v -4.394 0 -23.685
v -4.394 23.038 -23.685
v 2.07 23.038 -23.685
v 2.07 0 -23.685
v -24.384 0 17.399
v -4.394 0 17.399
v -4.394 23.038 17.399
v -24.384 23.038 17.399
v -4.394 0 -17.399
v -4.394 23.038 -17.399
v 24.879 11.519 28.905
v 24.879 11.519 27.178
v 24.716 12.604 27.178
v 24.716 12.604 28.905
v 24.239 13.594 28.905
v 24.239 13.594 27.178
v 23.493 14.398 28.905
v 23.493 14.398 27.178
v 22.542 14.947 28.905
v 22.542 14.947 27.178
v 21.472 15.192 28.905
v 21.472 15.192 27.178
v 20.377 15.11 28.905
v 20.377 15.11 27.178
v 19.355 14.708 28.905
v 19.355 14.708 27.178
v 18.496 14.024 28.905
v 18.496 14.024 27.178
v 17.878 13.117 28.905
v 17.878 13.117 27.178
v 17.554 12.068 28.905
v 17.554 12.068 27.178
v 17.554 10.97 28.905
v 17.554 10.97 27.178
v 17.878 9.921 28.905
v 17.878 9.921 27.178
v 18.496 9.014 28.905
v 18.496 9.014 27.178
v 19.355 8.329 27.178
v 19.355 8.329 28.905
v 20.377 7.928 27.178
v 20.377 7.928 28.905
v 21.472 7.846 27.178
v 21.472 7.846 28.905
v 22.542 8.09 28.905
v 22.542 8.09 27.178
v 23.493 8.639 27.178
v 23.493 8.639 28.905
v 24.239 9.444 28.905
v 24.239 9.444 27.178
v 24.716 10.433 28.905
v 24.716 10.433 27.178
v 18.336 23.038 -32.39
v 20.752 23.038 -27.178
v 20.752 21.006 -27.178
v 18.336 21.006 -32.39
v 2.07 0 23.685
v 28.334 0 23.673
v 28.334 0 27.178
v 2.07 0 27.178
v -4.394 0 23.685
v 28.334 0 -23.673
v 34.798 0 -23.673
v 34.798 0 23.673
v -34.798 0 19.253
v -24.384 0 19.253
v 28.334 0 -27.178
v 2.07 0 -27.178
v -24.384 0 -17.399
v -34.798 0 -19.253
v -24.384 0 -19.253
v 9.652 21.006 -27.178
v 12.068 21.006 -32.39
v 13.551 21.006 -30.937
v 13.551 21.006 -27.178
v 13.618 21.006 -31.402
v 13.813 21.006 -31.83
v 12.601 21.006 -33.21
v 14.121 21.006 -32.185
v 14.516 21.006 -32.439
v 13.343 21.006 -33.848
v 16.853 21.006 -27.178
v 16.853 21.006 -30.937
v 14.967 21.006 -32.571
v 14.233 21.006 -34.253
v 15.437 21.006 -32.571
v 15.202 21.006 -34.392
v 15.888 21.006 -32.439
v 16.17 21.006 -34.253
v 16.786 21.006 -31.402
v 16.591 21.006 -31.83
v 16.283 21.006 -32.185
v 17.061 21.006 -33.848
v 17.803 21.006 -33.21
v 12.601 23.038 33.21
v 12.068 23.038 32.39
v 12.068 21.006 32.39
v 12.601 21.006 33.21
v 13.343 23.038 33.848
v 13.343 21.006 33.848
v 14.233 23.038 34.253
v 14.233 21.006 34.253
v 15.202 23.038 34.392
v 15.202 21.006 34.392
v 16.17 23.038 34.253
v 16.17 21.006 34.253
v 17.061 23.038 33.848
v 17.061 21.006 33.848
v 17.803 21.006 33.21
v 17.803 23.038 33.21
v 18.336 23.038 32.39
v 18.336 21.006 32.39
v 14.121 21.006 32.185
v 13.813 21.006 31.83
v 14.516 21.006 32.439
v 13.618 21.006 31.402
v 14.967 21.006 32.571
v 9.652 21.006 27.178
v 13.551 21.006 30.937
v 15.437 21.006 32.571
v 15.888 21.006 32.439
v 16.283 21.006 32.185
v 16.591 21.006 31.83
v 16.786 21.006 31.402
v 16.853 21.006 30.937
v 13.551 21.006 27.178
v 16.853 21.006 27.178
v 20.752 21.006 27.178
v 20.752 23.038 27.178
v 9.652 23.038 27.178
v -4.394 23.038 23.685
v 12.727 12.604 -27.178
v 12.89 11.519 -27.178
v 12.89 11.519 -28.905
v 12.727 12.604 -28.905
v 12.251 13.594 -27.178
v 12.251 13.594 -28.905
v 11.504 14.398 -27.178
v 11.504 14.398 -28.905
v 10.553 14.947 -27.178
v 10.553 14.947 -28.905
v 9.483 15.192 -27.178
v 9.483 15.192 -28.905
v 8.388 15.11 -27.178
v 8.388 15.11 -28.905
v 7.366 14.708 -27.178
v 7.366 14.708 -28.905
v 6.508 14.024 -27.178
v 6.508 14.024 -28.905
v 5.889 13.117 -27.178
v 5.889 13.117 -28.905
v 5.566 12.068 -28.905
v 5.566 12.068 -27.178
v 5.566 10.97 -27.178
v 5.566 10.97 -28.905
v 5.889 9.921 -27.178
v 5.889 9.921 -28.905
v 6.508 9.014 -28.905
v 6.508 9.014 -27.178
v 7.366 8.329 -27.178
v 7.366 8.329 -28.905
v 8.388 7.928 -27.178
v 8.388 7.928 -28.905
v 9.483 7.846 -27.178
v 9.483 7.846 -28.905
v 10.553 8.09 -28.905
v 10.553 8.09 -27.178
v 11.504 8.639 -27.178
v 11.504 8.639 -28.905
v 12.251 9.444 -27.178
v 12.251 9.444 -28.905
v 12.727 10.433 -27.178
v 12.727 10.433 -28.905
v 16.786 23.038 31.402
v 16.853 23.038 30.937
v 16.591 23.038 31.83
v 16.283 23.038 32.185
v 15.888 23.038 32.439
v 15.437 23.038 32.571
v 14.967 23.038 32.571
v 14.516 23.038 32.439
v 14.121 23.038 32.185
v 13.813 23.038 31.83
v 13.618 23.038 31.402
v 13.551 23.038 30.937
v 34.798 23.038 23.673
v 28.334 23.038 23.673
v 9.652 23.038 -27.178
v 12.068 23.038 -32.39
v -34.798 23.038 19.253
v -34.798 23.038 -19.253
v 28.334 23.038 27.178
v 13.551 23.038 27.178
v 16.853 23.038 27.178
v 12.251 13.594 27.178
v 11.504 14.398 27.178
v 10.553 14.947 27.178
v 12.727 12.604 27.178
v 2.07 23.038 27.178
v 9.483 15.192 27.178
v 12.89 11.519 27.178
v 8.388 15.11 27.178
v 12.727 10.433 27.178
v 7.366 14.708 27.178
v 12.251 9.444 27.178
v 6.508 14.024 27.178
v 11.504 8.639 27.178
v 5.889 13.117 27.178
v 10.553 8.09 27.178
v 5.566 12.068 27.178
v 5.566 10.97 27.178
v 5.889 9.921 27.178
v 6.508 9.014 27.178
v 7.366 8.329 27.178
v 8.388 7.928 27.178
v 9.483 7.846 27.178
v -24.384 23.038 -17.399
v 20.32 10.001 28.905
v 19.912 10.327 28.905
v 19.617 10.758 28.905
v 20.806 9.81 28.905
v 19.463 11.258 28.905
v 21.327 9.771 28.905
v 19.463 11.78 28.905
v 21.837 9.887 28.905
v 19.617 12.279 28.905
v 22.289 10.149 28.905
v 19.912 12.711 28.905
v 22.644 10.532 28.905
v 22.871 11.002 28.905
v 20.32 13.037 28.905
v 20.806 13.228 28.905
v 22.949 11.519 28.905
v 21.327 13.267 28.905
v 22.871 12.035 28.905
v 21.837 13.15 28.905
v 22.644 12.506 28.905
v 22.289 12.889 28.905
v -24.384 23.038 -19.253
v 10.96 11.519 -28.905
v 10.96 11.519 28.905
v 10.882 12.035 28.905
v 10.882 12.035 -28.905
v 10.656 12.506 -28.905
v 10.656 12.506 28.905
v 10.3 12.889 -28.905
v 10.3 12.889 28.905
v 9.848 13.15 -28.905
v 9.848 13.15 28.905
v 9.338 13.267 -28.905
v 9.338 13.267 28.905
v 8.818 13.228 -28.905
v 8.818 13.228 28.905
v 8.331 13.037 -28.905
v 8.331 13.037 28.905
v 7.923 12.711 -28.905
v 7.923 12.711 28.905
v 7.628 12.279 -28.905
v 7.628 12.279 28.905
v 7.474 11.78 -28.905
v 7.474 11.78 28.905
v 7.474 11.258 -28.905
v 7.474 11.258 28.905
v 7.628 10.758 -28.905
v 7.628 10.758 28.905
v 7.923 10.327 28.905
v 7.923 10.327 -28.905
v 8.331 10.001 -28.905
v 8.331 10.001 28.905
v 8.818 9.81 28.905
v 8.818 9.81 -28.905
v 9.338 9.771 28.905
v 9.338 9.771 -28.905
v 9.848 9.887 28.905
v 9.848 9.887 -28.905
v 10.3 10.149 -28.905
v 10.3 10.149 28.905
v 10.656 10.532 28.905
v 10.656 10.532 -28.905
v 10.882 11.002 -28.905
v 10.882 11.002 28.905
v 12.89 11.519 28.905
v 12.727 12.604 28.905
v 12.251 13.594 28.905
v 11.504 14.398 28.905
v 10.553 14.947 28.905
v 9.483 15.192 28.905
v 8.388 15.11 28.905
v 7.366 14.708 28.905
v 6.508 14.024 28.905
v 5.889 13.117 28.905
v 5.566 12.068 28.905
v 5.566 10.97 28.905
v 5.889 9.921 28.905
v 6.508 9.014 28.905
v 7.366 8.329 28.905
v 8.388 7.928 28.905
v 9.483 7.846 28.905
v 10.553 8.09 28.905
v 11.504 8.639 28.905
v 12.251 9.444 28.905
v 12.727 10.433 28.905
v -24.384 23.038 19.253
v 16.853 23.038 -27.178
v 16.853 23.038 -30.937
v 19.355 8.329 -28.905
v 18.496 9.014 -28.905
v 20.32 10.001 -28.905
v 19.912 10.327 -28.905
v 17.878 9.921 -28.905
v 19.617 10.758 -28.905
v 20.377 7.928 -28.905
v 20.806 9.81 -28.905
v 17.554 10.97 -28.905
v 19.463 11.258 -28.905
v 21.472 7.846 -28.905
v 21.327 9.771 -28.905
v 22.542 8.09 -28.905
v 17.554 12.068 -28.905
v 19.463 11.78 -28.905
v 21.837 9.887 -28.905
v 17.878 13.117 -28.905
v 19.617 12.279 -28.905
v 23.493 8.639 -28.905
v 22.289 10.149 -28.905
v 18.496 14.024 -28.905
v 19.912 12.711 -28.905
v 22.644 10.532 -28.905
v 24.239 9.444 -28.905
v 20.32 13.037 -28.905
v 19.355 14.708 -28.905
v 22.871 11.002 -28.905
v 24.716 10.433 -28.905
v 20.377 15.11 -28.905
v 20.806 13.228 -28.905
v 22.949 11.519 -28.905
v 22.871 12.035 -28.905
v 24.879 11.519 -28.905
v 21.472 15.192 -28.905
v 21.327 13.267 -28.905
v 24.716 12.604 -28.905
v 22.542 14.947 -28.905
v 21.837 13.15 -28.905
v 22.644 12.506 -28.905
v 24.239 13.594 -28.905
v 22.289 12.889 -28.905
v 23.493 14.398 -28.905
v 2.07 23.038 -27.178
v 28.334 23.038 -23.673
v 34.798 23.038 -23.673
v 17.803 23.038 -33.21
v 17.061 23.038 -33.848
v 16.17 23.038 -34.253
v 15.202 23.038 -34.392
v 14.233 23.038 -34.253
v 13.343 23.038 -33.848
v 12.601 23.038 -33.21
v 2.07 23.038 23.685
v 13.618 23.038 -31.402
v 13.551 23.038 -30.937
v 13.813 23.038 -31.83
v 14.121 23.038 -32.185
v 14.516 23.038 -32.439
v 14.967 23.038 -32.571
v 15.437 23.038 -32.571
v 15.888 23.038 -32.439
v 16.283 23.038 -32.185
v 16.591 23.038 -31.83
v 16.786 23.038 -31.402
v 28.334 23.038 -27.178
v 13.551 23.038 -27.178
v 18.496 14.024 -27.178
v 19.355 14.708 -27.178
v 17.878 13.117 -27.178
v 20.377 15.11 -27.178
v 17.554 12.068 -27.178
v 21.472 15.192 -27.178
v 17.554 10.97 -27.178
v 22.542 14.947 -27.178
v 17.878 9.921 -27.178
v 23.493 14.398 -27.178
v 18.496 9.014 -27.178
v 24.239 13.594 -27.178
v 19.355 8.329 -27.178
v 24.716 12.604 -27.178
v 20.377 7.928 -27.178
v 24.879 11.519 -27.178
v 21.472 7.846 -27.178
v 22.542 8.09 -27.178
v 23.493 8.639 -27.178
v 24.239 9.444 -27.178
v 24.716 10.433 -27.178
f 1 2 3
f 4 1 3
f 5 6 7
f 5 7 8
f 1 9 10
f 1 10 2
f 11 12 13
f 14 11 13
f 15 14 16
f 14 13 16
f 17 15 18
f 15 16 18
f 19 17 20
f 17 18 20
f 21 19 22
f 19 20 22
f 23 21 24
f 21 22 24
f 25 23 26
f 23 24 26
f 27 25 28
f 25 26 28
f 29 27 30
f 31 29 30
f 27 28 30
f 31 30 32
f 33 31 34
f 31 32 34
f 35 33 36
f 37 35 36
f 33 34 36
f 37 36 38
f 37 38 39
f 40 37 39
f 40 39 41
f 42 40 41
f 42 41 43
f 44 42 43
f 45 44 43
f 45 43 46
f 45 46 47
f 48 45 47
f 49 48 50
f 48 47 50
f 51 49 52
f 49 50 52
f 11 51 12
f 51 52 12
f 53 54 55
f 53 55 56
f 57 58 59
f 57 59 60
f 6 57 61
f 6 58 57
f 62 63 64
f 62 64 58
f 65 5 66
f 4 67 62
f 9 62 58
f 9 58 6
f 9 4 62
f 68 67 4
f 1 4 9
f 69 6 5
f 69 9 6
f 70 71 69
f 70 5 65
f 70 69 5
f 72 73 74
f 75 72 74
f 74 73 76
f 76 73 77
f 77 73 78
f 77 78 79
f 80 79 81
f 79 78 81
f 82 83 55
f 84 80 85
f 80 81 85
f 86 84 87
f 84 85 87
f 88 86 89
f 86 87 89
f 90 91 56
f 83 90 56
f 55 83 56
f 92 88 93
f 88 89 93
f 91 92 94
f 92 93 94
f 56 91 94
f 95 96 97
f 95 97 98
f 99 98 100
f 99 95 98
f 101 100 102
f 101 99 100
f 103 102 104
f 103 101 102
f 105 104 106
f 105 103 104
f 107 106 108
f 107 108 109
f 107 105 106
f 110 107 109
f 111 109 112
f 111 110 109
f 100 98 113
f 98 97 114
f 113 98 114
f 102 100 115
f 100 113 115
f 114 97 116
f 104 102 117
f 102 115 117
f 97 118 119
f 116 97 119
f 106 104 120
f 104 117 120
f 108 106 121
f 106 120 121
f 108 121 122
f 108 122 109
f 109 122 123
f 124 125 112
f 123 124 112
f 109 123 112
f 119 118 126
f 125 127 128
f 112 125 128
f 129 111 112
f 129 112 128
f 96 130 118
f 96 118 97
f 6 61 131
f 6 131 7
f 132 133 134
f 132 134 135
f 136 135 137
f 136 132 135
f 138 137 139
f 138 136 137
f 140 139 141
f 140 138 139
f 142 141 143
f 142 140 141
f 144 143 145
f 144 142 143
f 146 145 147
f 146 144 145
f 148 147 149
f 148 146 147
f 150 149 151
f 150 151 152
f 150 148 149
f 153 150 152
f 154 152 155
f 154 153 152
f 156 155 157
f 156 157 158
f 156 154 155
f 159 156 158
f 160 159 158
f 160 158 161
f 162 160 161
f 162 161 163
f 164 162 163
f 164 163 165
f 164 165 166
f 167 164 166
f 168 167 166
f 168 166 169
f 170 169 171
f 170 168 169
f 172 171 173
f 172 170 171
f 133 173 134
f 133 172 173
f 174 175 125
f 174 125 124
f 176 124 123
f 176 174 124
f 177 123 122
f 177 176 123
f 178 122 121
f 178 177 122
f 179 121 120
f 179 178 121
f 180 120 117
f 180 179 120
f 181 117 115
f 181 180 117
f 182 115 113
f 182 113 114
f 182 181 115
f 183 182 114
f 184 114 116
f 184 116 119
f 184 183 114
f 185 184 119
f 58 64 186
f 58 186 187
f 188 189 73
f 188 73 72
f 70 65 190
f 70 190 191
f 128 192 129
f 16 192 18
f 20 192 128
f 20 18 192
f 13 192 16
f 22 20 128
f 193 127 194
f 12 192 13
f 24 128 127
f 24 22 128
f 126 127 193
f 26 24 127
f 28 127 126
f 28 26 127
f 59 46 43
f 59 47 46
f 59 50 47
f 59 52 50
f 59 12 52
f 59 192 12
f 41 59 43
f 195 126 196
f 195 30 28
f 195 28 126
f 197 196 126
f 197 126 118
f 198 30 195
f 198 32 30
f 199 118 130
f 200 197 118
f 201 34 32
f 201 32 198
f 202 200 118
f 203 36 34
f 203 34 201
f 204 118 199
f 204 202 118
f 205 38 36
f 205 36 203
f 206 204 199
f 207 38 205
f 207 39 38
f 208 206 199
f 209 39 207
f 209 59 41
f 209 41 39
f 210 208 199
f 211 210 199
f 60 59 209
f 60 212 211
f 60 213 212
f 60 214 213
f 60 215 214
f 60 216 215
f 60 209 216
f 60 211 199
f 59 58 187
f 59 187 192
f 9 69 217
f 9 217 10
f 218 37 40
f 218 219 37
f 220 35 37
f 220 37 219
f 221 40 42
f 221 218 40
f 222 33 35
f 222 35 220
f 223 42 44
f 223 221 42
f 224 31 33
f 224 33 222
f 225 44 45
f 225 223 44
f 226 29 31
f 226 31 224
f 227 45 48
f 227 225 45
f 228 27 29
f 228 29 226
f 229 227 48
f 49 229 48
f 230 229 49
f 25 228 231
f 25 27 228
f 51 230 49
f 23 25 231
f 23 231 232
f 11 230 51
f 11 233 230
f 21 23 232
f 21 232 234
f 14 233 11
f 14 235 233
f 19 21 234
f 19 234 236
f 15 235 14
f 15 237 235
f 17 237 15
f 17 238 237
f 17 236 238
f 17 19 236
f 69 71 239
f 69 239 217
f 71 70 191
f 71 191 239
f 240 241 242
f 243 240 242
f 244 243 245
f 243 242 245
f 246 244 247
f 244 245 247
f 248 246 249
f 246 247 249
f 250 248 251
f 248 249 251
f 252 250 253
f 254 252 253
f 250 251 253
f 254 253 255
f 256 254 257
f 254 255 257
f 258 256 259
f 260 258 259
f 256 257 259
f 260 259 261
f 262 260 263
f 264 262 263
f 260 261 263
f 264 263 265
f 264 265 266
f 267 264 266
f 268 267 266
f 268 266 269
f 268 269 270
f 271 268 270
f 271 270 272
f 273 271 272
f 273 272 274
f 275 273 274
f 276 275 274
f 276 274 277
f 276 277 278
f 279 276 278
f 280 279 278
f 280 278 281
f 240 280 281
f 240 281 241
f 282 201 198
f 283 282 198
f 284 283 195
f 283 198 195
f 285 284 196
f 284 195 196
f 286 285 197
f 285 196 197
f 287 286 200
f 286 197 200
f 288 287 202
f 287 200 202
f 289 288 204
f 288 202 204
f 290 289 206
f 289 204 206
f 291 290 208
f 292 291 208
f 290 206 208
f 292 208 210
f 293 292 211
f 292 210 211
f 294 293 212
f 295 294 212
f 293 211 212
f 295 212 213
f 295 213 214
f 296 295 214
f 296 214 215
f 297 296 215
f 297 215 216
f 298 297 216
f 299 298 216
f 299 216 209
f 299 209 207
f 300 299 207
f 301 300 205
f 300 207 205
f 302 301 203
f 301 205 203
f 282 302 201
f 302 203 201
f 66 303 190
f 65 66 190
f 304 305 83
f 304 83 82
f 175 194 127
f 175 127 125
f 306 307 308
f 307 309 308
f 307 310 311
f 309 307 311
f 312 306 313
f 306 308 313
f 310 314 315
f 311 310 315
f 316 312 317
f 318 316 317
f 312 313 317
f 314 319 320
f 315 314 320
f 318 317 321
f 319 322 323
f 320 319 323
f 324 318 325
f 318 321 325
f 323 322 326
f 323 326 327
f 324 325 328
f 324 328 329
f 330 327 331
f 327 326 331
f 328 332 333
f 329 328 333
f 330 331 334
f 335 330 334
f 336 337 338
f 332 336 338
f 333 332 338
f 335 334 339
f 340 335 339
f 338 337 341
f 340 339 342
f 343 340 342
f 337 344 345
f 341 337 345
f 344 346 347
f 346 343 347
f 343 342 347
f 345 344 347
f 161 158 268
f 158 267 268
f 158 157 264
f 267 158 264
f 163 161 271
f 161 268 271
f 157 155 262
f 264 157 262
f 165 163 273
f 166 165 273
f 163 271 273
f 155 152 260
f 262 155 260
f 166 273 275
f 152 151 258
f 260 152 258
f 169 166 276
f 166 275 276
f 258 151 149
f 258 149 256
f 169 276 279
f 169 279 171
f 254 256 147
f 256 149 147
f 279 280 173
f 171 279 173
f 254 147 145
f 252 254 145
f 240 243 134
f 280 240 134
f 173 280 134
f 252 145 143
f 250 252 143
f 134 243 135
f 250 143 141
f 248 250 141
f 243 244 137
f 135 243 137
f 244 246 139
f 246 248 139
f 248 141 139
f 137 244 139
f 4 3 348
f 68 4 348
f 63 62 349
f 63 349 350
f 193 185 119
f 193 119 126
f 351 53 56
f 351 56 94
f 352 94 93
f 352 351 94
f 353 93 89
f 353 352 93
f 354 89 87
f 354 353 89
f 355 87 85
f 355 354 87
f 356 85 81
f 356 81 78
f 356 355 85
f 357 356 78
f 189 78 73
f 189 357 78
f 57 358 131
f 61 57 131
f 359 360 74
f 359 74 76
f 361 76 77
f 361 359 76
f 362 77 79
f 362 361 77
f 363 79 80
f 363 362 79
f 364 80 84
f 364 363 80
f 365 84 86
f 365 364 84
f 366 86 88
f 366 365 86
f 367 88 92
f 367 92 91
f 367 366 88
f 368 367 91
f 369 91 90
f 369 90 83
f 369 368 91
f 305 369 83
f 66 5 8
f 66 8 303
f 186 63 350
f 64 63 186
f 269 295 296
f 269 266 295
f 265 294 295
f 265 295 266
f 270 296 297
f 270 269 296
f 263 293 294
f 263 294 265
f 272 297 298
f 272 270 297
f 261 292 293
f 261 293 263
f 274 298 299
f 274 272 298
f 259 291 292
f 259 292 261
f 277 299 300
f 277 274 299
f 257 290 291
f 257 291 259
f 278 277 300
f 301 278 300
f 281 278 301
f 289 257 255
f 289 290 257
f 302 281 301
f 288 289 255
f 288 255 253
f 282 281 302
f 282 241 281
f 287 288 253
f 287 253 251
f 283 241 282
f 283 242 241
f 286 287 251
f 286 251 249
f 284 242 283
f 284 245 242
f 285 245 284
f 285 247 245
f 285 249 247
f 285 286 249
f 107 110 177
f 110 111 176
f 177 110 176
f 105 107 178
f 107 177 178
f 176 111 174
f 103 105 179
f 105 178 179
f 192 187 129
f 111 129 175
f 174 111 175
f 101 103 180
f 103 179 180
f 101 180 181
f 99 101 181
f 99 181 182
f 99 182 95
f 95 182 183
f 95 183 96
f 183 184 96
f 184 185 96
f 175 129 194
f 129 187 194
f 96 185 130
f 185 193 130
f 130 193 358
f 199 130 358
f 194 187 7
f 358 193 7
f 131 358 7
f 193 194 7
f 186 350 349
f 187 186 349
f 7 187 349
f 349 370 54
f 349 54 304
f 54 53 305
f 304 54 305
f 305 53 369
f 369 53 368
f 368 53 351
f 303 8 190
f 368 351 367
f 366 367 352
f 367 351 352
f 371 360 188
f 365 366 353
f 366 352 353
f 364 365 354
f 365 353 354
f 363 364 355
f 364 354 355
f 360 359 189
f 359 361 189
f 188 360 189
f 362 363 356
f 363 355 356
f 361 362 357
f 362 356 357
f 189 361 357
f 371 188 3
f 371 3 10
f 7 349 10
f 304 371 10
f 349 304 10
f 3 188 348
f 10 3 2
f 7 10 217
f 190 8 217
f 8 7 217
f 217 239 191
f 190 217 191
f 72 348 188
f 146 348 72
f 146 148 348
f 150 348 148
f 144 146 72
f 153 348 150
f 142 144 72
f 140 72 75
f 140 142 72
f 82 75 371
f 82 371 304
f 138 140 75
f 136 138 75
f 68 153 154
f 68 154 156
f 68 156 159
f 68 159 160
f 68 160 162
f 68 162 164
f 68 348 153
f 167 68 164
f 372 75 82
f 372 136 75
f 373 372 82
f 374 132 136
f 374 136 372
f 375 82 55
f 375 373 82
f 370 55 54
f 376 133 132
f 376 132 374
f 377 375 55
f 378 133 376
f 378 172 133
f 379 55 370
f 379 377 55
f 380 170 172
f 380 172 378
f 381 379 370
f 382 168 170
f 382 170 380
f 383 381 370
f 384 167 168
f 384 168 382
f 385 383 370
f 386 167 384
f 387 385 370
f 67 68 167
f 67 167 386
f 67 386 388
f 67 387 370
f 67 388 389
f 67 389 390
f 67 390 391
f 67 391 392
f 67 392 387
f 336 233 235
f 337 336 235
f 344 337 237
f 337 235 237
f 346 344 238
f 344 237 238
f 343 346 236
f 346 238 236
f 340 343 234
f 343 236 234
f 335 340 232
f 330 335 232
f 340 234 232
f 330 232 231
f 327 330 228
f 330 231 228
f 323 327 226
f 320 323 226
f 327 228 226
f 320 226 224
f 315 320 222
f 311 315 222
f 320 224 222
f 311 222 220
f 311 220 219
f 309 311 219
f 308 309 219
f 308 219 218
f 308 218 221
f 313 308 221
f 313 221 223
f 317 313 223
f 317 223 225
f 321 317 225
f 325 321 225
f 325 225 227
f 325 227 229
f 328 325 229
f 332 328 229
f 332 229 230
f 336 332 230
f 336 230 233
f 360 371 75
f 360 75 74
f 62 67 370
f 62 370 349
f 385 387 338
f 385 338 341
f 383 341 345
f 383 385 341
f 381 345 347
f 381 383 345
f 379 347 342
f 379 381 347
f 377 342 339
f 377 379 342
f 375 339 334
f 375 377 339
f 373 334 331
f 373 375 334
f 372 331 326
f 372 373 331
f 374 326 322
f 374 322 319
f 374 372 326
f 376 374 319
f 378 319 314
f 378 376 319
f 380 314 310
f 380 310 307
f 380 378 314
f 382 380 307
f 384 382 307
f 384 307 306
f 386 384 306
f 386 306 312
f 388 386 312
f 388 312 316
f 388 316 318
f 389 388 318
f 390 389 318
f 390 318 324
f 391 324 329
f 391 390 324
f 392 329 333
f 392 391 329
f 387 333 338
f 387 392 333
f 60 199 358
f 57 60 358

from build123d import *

# Parameters (mm, degrees)
BOSS_EXTRUDE1_DEPTH = 23.0378
SKETCH2_R           = 3.683
BOSS_EXTRUDE2_DEPTH = 1.7272
SKETCH3_R           = 1.7526
CUT_EXTRUDE1_DEPTH  = 58.8104
BOSS_EXTRUDE3_DEPTH = 2.032


with BuildPart() as part:
    # Sketch1 → Boss-Extrude1 (new body)
    with BuildSketch(Plane(origin=(0, 0, 0), x_dir=(1, 0, 0), z_dir=(0, 1, 0))):
        Polygon((-34.798, 19.2532), (-24.384, 19.2532), (-24.384, 17.399), (-4.3942, 17.399), (-4.3942, 23.684705806), (2.0701, 23.684705806), (2.0701, 27.178), (28.3337, 27.178), (28.3337, 23.6728), (34.798, 23.6728), (34.798, -23.6728), (28.3337, -23.6728), (28.3337, -27.178), (2.0701, -27.178), (2.0701, -23.684705806), (-4.3942, -23.684705806), (-4.3942, -17.399), (-24.384, -17.399), (-24.384, -19.2532), (-34.798, -19.2532), align=None)
    extrude(amount=BOSS_EXTRUDE1_DEPTH)

    # Sketch2 → Boss-Extrude2 (add)
    with BuildSketch(Plane.XY.offset(27.178)):
        with Locations((21.1963, 11.5189)):
            Circle(SKETCH2_R)
        with Locations((9.2075, 11.5189)):
            Circle(SKETCH2_R)
    boss_extrude2 = extrude(amount=BOSS_EXTRUDE2_DEPTH)

    # Mirror1: Boss-Extrude2 across plane
    add(boss_extrude2.mirror(Plane.XY))

    # Sketch3 → Cut-Extrude1 (cut, through all)
    with BuildSketch(Plane.XY.offset(28.9052)):
        with Locations((21.1963, 11.5189)):
            Circle(SKETCH3_R)
        with Locations((9.2075, 11.5189)):
            Circle(SKETCH3_R)
    extrude(amount=-CUT_EXTRUDE1_DEPTH, mode=Mode.SUBTRACT)

    # Sketch4 → Boss-Extrude3 (add)
    with BuildSketch(Plane(origin=(0, 23.0378, 0), x_dir=(1, 0, 0), z_dir=(0, 1, 0))):
        with BuildLine():
            Line((13.5509, -27.178), (9.652, -27.178))
            Line((9.652, -27.178), (12.067809158, -32.389905736))
            ThreePointArc((12.067809158, -32.389905736), (15.2019, -34.3916), (18.335990842, -32.389905736))
            Line((18.335990842, -32.389905736), (20.7518, -27.178))
            Line((20.7518, -27.178), (16.8529, -27.178))
            Line((16.8529, -27.178), (16.8529, -30.9372))
            ThreePointArc((16.8529, -30.9372), (15.2019, -32.5882), (13.5509, -30.9372))
            Line((13.5509, -30.9372), (13.5509, -27.178))
        make_face()
        with BuildLine():
            Line((16.8529, 30.9372), (16.8529, 27.178))
            Line((16.8529, 27.178), (20.7518, 27.178))
            Line((20.7518, 27.178), (18.335990842, 32.389905736))
            ThreePointArc((18.335990842, 32.389905736), (15.2019, 34.3916), (12.067809158, 32.389905736))
            Line((12.067809158, 32.389905736), (9.652, 27.178))
            Line((9.652, 27.178), (13.5509, 27.178))
            Line((13.5509, 27.178), (13.5509, 30.9372))
            ThreePointArc((13.5509, 30.9372), (15.2019, 32.5882), (16.8529, 30.9372))
        make_face()
    extrude(amount=-BOSS_EXTRUDE3_DEPTH)


solid = part.part
